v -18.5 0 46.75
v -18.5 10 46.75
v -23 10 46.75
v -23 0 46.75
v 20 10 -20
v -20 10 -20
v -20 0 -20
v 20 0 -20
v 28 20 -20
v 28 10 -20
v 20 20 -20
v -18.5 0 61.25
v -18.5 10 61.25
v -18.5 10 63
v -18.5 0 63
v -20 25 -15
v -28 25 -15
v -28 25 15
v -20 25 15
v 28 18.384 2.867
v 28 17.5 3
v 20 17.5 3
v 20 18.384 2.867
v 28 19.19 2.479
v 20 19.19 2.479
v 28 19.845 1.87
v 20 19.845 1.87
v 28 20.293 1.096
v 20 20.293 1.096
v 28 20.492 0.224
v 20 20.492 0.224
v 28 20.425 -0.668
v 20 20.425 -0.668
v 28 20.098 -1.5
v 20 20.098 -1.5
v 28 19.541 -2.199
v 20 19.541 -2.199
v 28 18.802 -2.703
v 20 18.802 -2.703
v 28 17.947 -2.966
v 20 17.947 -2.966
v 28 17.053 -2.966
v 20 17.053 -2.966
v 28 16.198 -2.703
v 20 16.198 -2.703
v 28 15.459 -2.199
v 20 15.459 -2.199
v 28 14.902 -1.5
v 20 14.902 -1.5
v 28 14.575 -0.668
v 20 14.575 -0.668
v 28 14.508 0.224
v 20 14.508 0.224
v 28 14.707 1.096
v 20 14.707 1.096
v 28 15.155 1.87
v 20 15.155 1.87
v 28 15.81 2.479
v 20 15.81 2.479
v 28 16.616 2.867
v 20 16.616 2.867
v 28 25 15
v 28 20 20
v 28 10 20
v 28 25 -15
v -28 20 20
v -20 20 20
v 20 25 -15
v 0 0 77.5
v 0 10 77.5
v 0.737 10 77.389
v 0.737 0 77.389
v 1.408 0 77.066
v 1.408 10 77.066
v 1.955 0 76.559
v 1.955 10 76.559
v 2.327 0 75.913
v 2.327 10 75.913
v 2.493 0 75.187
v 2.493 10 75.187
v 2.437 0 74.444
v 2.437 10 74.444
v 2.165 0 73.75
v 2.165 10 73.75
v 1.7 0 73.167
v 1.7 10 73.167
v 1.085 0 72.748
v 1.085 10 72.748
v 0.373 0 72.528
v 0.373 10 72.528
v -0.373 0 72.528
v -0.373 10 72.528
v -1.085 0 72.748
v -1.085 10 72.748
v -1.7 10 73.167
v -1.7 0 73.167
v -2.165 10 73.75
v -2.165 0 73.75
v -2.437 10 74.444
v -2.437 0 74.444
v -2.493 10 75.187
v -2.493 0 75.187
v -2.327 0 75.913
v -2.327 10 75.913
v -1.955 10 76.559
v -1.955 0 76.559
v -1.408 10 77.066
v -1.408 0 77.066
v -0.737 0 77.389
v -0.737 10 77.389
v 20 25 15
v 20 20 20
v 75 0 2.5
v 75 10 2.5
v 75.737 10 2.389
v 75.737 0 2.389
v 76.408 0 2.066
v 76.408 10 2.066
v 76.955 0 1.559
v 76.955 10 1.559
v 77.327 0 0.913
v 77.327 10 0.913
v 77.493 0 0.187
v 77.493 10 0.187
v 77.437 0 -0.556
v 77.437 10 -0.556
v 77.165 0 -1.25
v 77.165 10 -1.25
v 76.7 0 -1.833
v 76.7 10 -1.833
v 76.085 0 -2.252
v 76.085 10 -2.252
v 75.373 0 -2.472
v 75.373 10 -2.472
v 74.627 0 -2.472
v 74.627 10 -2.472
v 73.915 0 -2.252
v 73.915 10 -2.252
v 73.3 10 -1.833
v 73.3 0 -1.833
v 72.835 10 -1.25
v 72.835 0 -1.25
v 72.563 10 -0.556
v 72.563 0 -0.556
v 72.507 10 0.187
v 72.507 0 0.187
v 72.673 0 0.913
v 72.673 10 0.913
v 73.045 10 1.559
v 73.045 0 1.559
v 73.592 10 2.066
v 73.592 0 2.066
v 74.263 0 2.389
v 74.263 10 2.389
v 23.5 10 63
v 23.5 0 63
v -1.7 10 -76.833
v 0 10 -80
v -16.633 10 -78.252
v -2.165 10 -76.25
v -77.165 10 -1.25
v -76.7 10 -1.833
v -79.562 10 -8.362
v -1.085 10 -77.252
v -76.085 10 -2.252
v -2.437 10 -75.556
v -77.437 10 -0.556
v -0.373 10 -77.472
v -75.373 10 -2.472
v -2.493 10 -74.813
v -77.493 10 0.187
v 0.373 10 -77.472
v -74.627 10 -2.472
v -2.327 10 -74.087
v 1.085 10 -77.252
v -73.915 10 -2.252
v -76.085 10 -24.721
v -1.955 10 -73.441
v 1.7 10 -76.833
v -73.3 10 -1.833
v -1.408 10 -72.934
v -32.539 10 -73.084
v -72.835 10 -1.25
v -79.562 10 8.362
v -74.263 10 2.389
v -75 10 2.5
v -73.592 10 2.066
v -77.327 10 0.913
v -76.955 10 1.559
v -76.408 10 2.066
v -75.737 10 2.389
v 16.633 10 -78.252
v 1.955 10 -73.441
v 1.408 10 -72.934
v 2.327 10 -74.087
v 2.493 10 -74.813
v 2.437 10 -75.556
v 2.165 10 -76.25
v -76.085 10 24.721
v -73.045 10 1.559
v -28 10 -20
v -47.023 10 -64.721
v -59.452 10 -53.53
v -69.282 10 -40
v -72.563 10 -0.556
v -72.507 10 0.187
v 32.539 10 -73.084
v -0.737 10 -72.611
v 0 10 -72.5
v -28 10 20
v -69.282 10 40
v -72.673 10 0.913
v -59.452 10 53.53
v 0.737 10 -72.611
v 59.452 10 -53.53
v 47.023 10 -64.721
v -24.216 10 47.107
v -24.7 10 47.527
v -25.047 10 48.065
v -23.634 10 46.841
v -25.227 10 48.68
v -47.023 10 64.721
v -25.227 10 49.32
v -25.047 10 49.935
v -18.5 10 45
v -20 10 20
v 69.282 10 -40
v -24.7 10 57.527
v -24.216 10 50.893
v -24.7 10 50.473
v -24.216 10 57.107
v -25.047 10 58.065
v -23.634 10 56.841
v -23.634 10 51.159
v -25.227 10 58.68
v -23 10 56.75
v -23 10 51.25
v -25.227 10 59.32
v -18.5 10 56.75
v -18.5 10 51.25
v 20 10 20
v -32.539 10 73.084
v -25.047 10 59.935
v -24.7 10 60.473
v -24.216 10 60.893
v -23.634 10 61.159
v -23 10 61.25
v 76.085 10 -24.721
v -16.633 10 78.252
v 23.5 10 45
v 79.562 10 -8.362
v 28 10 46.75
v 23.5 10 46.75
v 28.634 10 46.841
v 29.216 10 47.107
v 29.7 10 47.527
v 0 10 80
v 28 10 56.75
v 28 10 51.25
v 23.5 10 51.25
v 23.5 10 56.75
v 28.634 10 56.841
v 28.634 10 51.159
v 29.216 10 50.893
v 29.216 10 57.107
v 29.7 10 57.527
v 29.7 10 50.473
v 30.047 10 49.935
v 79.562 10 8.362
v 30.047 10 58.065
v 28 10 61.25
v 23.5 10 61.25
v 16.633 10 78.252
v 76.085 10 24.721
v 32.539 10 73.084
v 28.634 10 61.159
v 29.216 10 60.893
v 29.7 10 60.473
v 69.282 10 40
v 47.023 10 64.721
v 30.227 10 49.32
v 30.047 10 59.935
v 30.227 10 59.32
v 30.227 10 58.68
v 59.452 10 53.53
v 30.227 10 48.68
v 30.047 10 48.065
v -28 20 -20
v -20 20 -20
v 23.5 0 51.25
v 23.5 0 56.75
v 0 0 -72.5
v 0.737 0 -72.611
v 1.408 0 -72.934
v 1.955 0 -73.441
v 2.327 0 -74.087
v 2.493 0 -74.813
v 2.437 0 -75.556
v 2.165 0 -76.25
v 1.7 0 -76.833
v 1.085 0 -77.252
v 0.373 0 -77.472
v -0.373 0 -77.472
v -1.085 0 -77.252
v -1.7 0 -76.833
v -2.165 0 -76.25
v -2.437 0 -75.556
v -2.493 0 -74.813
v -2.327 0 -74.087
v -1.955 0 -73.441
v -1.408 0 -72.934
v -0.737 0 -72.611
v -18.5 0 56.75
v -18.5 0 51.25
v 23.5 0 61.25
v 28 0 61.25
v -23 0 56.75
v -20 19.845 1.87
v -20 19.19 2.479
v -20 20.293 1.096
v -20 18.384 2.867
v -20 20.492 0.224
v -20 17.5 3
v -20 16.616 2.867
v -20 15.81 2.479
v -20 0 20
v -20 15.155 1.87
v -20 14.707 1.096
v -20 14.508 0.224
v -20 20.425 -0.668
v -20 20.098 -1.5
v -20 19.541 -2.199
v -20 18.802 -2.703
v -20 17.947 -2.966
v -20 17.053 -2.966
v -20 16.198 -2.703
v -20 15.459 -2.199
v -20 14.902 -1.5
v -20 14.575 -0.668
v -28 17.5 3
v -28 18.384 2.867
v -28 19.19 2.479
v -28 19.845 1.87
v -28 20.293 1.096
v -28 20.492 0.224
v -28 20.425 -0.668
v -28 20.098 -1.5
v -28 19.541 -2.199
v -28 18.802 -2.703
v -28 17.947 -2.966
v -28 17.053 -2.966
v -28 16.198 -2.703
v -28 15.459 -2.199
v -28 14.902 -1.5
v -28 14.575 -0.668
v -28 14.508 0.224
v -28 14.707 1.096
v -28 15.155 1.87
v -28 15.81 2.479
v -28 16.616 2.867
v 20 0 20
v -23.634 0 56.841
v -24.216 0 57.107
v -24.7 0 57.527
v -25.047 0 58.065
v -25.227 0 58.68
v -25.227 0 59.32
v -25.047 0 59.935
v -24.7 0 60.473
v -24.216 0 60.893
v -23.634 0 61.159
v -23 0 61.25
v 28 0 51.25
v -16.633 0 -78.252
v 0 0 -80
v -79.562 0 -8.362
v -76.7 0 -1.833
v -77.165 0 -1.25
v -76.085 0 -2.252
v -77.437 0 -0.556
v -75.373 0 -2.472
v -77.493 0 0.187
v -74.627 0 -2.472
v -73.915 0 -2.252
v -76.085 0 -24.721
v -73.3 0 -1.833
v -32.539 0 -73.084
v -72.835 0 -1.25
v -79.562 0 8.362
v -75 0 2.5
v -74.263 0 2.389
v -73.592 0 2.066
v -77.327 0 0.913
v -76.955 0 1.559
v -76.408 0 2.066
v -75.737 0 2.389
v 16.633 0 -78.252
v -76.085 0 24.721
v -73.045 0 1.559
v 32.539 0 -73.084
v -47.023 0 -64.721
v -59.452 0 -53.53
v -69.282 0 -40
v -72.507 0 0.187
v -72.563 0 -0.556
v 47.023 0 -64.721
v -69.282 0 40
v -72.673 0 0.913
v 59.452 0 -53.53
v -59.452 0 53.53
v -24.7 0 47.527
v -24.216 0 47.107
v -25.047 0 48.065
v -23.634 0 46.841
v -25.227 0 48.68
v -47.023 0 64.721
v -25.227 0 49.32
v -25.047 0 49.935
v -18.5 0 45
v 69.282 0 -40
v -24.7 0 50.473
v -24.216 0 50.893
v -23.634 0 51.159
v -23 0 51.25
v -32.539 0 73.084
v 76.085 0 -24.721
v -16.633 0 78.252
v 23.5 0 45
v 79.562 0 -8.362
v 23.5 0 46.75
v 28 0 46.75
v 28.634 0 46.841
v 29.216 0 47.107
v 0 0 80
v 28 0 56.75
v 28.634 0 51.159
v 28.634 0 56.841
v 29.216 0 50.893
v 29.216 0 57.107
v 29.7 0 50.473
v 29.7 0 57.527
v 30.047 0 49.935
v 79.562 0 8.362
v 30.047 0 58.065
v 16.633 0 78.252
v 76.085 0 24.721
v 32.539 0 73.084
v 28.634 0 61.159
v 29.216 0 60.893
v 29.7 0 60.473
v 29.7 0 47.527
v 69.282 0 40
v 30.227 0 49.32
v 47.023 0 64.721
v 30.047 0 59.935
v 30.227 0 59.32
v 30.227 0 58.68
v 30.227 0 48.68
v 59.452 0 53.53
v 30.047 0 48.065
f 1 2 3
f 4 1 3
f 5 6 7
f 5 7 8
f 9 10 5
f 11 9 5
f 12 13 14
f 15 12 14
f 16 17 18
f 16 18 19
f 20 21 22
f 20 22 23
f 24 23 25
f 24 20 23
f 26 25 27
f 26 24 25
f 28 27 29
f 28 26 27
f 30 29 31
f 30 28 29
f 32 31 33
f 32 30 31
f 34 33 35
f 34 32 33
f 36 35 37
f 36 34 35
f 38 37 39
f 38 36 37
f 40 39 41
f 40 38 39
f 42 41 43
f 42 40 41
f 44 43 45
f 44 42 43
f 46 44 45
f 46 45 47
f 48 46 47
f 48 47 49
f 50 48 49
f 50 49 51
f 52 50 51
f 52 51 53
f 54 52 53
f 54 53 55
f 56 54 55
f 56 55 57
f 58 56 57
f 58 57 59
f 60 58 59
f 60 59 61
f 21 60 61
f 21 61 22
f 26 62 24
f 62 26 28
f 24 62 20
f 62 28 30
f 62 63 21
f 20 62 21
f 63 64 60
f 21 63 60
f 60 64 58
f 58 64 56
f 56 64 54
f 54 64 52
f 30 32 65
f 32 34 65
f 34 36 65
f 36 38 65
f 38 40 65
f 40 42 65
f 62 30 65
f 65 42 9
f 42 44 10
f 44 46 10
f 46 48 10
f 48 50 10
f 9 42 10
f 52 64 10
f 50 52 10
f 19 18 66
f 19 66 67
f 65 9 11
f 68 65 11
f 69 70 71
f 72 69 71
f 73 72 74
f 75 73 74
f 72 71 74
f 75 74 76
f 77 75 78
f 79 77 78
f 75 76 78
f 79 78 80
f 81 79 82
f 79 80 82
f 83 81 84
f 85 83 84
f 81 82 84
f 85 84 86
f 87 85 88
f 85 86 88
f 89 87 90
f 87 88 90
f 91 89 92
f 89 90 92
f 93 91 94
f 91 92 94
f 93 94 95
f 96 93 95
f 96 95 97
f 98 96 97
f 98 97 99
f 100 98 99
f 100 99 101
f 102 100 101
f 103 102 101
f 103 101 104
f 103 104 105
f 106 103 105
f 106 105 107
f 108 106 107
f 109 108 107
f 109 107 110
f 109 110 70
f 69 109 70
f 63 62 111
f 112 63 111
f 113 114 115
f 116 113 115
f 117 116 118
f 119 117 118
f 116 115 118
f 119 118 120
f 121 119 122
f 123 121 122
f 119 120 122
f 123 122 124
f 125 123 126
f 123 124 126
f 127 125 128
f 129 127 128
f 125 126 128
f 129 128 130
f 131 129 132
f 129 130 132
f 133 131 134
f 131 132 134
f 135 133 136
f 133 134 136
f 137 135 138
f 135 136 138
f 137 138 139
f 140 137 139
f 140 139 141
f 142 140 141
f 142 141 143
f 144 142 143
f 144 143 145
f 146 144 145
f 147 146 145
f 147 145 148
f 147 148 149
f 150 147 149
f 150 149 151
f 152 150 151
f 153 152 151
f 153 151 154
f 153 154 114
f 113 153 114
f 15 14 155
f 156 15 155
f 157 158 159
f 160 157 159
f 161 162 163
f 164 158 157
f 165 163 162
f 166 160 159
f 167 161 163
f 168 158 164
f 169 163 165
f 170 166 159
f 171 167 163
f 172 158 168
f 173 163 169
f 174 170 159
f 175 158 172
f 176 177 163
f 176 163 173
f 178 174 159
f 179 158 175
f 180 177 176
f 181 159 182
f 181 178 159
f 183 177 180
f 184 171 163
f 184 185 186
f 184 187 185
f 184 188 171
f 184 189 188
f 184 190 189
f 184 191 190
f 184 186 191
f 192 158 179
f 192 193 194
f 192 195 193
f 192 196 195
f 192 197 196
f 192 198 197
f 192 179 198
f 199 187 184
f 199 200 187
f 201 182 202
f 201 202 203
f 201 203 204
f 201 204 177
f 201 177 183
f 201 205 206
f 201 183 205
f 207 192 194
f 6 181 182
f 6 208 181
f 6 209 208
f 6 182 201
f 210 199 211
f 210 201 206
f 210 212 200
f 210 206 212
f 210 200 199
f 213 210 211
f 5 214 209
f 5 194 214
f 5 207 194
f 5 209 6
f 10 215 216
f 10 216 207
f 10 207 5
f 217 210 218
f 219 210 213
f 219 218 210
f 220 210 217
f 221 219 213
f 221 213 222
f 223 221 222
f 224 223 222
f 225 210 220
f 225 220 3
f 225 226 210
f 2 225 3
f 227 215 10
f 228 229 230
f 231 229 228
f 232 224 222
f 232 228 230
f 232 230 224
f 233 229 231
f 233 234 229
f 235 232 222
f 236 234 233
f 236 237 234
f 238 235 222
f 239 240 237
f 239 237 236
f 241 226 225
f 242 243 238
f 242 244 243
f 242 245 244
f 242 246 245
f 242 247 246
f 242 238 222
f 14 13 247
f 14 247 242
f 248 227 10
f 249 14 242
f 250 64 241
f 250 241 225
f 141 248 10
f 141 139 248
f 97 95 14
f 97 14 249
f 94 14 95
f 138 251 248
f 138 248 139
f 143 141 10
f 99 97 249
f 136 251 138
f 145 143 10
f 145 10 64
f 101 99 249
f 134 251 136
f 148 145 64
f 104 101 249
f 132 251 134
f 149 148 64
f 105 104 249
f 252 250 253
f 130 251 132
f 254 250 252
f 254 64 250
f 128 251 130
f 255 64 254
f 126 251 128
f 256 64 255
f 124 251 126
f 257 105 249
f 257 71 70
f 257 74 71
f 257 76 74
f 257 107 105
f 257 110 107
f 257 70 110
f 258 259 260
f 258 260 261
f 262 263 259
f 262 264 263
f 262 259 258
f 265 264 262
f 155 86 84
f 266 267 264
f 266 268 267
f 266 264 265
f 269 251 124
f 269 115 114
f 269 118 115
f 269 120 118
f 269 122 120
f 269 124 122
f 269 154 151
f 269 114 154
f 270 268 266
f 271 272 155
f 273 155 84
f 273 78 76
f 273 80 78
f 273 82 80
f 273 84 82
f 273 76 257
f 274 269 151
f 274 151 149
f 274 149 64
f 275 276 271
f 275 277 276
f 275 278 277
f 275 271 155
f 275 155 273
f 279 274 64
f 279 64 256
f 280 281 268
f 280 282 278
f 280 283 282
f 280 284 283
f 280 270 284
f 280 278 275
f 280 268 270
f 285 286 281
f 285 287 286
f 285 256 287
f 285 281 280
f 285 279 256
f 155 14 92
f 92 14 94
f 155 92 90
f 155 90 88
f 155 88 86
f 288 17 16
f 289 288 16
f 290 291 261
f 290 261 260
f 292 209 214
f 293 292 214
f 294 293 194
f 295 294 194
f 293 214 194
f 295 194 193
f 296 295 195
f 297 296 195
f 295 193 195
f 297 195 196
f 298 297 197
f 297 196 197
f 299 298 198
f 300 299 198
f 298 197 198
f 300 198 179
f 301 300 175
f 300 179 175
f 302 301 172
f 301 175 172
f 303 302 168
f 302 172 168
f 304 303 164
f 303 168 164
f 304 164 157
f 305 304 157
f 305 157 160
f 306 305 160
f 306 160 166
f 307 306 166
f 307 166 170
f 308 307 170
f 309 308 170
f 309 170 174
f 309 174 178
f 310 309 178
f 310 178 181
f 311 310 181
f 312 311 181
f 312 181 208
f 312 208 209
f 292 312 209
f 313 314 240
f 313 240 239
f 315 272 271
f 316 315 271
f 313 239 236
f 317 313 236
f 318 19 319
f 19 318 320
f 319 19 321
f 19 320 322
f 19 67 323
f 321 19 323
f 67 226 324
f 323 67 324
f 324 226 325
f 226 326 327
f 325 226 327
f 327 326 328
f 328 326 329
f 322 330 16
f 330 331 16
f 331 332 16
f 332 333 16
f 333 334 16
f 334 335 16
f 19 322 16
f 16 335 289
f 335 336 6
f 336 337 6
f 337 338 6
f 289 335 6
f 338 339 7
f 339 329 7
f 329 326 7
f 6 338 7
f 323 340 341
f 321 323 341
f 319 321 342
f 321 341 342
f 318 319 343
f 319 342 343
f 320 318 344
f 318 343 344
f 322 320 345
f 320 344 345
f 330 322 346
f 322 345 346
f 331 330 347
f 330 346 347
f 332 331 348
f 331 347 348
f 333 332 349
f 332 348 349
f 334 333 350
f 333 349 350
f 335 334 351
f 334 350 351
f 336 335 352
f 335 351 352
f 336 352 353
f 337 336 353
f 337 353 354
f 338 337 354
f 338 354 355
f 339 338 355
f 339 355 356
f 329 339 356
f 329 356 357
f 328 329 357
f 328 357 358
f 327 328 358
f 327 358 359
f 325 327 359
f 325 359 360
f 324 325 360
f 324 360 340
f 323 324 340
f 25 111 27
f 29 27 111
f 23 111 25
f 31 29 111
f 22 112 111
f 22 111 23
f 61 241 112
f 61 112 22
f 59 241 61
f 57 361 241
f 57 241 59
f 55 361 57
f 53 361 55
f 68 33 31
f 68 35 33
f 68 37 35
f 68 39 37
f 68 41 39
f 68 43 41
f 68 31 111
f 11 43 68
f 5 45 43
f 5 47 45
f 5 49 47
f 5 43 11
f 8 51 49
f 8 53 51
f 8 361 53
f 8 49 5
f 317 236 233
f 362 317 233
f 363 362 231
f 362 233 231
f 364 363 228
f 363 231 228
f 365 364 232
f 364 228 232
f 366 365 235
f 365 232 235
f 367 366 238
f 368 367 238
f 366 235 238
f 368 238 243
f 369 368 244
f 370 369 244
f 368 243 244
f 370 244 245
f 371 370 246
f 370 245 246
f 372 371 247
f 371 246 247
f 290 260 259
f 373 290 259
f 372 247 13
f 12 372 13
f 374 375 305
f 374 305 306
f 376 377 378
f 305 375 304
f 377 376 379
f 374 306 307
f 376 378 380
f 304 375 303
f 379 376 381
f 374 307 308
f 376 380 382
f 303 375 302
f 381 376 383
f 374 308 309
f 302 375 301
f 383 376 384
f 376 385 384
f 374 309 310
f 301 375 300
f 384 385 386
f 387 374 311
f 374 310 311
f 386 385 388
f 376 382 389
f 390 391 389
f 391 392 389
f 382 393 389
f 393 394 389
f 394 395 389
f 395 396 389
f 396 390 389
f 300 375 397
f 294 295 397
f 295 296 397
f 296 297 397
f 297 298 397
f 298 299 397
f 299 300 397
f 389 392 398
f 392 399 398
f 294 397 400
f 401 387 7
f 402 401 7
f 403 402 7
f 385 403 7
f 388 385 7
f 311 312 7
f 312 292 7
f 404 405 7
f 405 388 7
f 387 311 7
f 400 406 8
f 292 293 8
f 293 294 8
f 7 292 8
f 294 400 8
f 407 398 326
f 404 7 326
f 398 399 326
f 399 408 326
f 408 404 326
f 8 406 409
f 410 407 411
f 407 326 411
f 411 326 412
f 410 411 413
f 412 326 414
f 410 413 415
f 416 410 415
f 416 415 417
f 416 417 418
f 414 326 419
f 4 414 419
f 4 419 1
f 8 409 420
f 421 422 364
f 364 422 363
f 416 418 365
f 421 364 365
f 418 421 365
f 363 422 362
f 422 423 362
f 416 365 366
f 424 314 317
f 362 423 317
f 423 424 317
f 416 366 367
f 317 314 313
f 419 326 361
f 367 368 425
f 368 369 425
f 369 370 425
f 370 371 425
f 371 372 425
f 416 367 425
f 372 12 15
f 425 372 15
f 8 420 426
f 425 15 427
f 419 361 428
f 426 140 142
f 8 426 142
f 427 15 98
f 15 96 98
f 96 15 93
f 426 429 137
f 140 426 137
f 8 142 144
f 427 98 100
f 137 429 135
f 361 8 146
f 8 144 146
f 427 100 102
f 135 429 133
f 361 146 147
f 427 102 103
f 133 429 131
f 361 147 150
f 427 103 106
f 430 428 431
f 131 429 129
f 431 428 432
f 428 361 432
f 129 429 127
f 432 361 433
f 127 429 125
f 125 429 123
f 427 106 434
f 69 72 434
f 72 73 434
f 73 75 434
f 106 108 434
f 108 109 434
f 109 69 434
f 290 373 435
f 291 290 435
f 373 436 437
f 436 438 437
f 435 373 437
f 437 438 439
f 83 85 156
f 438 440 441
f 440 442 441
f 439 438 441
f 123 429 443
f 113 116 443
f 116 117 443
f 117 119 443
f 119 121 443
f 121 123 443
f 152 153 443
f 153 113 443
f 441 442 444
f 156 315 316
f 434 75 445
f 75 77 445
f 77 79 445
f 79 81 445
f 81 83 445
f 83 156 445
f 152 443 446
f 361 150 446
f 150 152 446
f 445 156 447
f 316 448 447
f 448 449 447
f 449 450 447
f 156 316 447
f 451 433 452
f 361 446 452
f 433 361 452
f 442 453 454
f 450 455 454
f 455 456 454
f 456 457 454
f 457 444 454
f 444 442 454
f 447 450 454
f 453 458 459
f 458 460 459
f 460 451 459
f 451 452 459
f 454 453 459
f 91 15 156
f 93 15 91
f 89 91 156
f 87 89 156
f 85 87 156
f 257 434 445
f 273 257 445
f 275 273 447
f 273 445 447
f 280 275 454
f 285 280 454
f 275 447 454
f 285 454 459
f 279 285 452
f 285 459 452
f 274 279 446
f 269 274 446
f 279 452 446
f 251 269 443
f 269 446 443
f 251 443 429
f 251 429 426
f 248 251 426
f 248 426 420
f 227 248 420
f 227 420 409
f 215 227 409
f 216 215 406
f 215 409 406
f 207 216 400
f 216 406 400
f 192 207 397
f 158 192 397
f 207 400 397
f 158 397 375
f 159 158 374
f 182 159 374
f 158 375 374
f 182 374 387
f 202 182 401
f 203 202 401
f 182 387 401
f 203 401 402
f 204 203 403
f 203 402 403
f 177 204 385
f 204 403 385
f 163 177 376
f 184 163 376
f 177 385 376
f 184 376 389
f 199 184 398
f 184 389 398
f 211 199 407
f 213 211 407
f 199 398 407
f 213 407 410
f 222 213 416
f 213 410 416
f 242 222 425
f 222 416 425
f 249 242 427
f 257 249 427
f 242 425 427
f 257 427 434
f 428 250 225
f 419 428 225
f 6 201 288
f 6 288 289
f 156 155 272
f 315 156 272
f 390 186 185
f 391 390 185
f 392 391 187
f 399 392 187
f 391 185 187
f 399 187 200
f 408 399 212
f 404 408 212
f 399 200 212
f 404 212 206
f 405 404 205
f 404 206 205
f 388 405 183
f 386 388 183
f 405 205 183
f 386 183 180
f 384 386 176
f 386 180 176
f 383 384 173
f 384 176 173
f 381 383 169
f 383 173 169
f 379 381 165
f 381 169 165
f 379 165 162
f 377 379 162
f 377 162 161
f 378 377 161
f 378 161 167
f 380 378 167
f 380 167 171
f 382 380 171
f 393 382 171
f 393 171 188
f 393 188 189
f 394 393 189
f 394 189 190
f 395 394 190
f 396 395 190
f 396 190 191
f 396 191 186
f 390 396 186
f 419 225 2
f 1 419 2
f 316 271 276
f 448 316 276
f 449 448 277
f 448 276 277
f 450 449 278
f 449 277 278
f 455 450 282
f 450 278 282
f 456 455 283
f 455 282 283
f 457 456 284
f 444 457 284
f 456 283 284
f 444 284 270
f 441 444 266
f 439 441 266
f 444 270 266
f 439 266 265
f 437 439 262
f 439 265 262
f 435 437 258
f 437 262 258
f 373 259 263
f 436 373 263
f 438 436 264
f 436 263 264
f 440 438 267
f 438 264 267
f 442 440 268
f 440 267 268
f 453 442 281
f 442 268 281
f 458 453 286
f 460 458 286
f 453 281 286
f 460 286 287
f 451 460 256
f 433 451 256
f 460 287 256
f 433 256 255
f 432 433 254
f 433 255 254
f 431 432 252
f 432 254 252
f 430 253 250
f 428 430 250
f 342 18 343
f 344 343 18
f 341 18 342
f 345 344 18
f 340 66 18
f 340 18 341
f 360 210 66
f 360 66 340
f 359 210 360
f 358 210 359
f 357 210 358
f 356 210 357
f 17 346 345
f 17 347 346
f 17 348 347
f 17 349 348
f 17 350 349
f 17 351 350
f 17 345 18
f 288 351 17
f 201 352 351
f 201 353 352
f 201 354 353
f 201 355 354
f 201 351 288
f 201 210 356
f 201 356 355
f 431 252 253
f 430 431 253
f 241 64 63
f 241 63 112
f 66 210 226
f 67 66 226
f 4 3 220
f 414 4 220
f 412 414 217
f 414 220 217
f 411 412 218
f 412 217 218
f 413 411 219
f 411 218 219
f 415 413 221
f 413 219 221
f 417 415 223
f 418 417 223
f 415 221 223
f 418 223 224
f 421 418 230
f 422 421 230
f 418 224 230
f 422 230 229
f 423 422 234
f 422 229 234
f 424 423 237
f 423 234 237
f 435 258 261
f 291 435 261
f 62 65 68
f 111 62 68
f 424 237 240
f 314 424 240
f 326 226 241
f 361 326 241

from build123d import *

# Parameters (mm, degrees)
SKETCH1_R               = 80
BOSS_EXTRUDE1_DEPTH     = 10
CUT_EXTRUDE1_REACH      = 115.578
SKETCH2_R               = 2.5
CUT_EXTRUDE2_REACH      = 115.578
SKETCH3_W               = 40
SKETCH3_H               = 40
CUT_EXTRUDE3_REACH      = 115.578
SKETCH5_W               = 8
SKETCH5_H               = 40
BOSS_EXTRUDE2_DEPTH     = 15
FILLET1_SIZE            = 5
CUT_EXTRUDE4_REACH      = 138.708
SKETCH6_R               = 3
FILLET1_OF_MIRROR1_SIZE = 5


with BuildPart() as part:
    # Sketch1 → Boss-Extrude1 (new body)
    with BuildSketch(Plane(origin=(0, 0, 0), x_dir=(1, 0, 0), z_dir=(0, 1, 0))):
        with Locations(Location((0, 0, 0), (0, 0, 270))):
            Circle(SKETCH1_R)
    extrude(amount=BOSS_EXTRUDE1_DEPTH)

    # Sketch2 → Cut-Extrude1 (cut, up to next)
    with BuildSketch(Plane(origin=(0, 10, 0), x_dir=(1, 0, 0), z_dir=(0, 1, 0)), mode=Mode.PRIVATE) as cut_extrude1_sk1:
        with Locations(Location((-75, 0, 0), (0, 0, 270))):
            Circle(SKETCH2_R)
    cut_extrude1_tool1 = extrude(cut_extrude1_sk1.sketch, amount=-CUT_EXTRUDE1_REACH, mode=Mode.PRIVATE) & part.part
    # Sketch2 → Cut-Extrude1 (cut, up to next)
    with BuildSketch(Plane(origin=(0, 10, 0), x_dir=(1, 0, 0), z_dir=(0, 1, 0)), mode=Mode.PRIVATE) as cut_extrude1_sk2:
        with Locations(Location((0, 75, 0), (0, 0, 270))):
            Circle(SKETCH2_R)
    cut_extrude1_tool2 = extrude(cut_extrude1_sk2.sketch, amount=-CUT_EXTRUDE1_REACH, mode=Mode.PRIVATE) & part.part
    # Sketch2 → Cut-Extrude1 (cut, up to next)
    with BuildSketch(Plane(origin=(0, 10, 0), x_dir=(1, 0, 0), z_dir=(0, 1, 0)), mode=Mode.PRIVATE) as cut_extrude1_sk3:
        with Locations(Location((75, 0, 0), (0, 0, 270))):
            Circle(SKETCH2_R)
    cut_extrude1_tool3 = extrude(cut_extrude1_sk3.sketch, amount=-CUT_EXTRUDE1_REACH, mode=Mode.PRIVATE) & part.part
    # Sketch2 → Cut-Extrude1 (cut, up to next)
    with BuildSketch(Plane(origin=(0, 10, 0), x_dir=(1, 0, 0), z_dir=(0, 1, 0)), mode=Mode.PRIVATE) as cut_extrude1_sk4:
        with Locations(Location((0, -75, 0), (0, 0, 270))):
            Circle(SKETCH2_R)
    cut_extrude1_tool4 = extrude(cut_extrude1_sk4.sketch, amount=-CUT_EXTRUDE1_REACH, mode=Mode.PRIVATE) & part.part
    add(cut_extrude1_tool1.solids().sort_by_distance((-75, 10, 0))[0], mode=Mode.SUBTRACT)
    add(cut_extrude1_tool2.solids().sort_by_distance((0, 10, -75))[0], mode=Mode.SUBTRACT)
    add(cut_extrude1_tool3.solids().sort_by_distance((75, 10, 0))[0], mode=Mode.SUBTRACT)
    add(cut_extrude1_tool4.solids().sort_by_distance((0, 10, 75))[0], mode=Mode.SUBTRACT)

    # Sketch3 → Cut-Extrude2 (cut, up to next)
    with BuildSketch(Plane(origin=(0, 10, 0), x_dir=(1, 0, 0), z_dir=(0, 1, 0)), mode=Mode.PRIVATE) as cut_extrude2_sk1:
        Rectangle(SKETCH3_W, SKETCH3_H)
    cut_extrude2_tool1 = extrude(cut_extrude2_sk1.sketch, amount=-CUT_EXTRUDE2_REACH, mode=Mode.PRIVATE) & part.part
    add(cut_extrude2_tool1.solids().sort_by_distance((0, 10, 0))[0], mode=Mode.SUBTRACT)

    # Sketch4 → Cut-Extrude3 (cut, up to next)
    with BuildSketch(Plane(origin=(0, 10, 0), x_dir=(1, 0, 0), z_dir=(0, 1, 0)), mode=Mode.PRIVATE) as cut_extrude3_sk1:
        with BuildLine():
            Line((23.5, -45), (-18.5, -45))
            Line((-18.5, -45), (-18.5, -46.75))
            Line((-18.5, -46.75), (-23, -46.75))
            ThreePointArc((-23, -46.75), (-25.25, -49), (-23, -51.25))
            Line((-23, -51.25), (-18.5, -51.25))
            Line((-18.5, -51.25), (-18.5, -56.75))
            Line((-18.5, -56.75), (-23, -56.75))
            ThreePointArc((-23, -56.75), (-25.25, -59), (-23, -61.25))
            Line((-23, -61.25), (-18.5, -61.25))
            Line((-18.5, -61.25), (-18.5, -63))
            Line((-18.5, -63), (23.5, -63))
            Line((23.5, -63), (23.5, -61.25))
            Line((23.5, -61.25), (28, -61.25))
            ThreePointArc((28, -61.25), (30.25, -59), (28, -56.75))
            Line((28, -56.75), (23.5, -56.75))
            Line((23.5, -56.75), (23.5, -51.25))
            Line((23.5, -51.25), (28, -51.25))
            ThreePointArc((28, -51.25), (30.25, -49), (28, -46.75))
            Line((28, -46.75), (23.5, -46.75))
            Line((23.5, -46.75), (23.5, -45))
        make_face()
    cut_extrude3_tool1 = extrude(cut_extrude3_sk1.sketch, amount=-CUT_EXTRUDE3_REACH, mode=Mode.PRIVATE) & part.part
    add(cut_extrude3_tool1.solids().sort_by_distance((2.5, 10, 54))[0], mode=Mode.SUBTRACT)

    # Sketch5 → Boss-Extrude2 (add)
    with BuildSketch(Plane(origin=(0, 10, 0), x_dir=(1, 0, 0), z_dir=(0, 1, 0))):
        with Locations((-24, 0)):
            Rectangle(SKETCH5_W, SKETCH5_H)
    boss_extrude2 = extrude(amount=BOSS_EXTRUDE2_DEPTH)

    # Fillet1
    fillet1_edges = [part.edges().sort_by_distance(p)[0] for p in [
        (-24, 25, -20),
        (-24, 25, 20),
    ]]
    chamfer(fillet1_edges, length=FILLET1_SIZE)

    # Sketch6 → Cut-Extrude4 (cut, up to next)
    with BuildSketch(Plane.ZY.offset(28), mode=Mode.PRIVATE) as cut_extrude4_sk1:
        with Locations((0, 17.5)):
            Circle(SKETCH6_R)
    cut_extrude4_tool1 = extrude(cut_extrude4_sk1.sketch, amount=-CUT_EXTRUDE4_REACH, mode=Mode.PRIVATE) & part.part
    cut_extrude4 = cut_extrude4_tool1.solids().sort_by_distance((-28, 17.5, 0))[0]
    add(cut_extrude4, mode=Mode.SUBTRACT)

    # Mirror1: Boss-Extrude2, Cut-Extrude4 across plane
    add(boss_extrude2.mirror(Plane.ZY))
    add(cut_extrude4.mirror(Plane.ZY), mode=Mode.SUBTRACT)

    # Fillet1 of Mirror1
    fillet1_of_mirror1_edges = [part.edges().sort_by_distance(p)[0] for p in [
        (24, 25, -20),
        (24, 25, 20),
    ]]
    chamfer(fillet1_of_mirror1_edges, length=FILLET1_OF_MIRROR1_SIZE)


solid = part.part
